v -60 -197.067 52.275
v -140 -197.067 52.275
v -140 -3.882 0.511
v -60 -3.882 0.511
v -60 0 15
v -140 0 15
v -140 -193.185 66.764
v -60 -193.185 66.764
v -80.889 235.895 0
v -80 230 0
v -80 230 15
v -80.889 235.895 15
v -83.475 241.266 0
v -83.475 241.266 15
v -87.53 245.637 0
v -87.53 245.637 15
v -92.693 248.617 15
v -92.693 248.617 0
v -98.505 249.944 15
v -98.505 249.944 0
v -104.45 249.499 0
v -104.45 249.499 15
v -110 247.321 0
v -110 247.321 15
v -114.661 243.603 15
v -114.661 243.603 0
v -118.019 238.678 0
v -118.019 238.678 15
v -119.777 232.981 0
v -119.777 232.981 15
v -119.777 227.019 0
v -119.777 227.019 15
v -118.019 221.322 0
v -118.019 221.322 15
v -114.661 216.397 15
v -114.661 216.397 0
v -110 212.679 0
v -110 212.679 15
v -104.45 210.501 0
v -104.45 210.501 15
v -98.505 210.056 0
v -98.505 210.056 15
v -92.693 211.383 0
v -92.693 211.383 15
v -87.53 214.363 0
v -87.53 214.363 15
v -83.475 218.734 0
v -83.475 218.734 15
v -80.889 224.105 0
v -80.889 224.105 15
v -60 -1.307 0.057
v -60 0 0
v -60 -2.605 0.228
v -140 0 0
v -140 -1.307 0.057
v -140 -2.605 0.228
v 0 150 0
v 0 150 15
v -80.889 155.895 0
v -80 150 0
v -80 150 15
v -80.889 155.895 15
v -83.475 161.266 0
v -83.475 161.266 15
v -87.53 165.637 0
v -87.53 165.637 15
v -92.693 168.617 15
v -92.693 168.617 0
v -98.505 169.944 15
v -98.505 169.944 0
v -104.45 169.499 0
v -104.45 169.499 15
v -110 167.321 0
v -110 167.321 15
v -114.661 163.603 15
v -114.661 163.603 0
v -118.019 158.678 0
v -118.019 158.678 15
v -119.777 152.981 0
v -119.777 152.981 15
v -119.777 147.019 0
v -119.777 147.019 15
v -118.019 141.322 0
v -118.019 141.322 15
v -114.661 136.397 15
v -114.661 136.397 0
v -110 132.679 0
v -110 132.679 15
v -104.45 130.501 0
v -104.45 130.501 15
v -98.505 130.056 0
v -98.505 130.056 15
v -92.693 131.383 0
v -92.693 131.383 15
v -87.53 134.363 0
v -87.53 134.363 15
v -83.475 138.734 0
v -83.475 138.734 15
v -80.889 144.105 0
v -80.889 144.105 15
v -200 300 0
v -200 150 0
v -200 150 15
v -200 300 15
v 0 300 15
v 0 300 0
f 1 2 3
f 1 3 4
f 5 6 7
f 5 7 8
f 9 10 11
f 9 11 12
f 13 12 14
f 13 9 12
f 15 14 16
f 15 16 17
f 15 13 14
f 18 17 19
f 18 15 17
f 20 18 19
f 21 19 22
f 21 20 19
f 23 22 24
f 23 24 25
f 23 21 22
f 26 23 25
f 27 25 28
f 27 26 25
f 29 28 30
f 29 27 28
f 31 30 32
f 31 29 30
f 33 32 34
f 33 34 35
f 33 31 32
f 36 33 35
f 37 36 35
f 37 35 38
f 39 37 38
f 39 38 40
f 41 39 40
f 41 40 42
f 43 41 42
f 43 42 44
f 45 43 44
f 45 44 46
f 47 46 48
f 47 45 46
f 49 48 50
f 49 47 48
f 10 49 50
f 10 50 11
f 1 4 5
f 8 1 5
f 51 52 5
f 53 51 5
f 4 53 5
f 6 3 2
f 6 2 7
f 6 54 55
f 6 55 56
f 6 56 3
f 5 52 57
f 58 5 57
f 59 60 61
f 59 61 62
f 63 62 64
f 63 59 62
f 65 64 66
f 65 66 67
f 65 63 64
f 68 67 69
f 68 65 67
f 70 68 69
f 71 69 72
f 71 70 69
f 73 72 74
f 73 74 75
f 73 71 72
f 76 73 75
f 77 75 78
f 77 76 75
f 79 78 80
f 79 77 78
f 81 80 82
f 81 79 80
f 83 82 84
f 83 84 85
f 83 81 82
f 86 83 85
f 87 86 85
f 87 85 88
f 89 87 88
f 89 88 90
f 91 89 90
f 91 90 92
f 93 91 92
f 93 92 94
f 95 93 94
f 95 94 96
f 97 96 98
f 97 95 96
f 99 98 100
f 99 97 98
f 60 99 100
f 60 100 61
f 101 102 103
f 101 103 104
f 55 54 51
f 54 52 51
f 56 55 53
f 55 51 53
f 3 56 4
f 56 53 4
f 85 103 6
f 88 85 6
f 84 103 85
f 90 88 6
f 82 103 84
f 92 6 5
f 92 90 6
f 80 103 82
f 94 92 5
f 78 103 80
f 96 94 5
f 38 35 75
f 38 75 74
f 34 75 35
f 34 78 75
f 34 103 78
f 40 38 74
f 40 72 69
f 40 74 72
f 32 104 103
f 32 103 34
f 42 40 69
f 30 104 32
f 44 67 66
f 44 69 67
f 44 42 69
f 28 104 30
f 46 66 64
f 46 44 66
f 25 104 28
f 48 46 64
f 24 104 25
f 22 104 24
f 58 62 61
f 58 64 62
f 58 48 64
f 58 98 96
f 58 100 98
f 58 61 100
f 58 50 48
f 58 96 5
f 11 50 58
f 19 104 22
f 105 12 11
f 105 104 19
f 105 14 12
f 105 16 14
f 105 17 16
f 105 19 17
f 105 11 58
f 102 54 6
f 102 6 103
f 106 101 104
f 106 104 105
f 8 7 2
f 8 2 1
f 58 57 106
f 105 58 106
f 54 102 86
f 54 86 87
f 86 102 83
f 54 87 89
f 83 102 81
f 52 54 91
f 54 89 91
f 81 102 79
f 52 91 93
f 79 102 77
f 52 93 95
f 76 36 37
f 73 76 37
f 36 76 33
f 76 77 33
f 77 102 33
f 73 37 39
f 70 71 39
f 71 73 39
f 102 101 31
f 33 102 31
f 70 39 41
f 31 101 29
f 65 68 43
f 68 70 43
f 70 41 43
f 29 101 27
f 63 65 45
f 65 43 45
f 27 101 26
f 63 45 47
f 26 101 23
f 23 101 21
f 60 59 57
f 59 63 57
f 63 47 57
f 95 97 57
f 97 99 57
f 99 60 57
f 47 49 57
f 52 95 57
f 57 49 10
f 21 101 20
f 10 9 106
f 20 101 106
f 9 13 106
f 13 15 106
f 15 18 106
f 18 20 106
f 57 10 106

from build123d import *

# Parameters (mm, degrees)
SKETCH1_W           = 200
SKETCH1_H           = 300
SKETCH1_R           = 20
BOSS_EXTRUDE1_DEPTH = 15
CUT_EXTRUDE1_DEPTH  = 15
SKETCH3_W           = 80
SKETCH3_H           = 15
REVOLVE1_ANGLE      = 15
SKETCH4_W           = 80
SKETCH4_H           = 15
BOSS_EXTRUDE3_DEPTH = 200


with BuildPart() as part:
    # Sketch1 → Boss-Extrude1 (new body)
    with BuildSketch(Plane.XY):
        with Locations((-100, 150)):
            Rectangle(SKETCH1_W, SKETCH1_H)
        with Locations((-100, 230)):
            Circle(SKETCH1_R, mode=Mode.SUBTRACT)
        with Locations((-100, 150)):
            Circle(SKETCH1_R, mode=Mode.SUBTRACT)
    extrude(amount=BOSS_EXTRUDE1_DEPTH)

    # Sketch2 → Cut-Extrude1 (cut)
    with BuildSketch(Plane(origin=(0, 0, 0), x_dir=(-1, 0, 0), z_dir=(0, 0, -1))):
        Polygon((0, 0), (60, 0), (0, 150), align=None)
        Polygon((200, 0), (140, 0), (200, 150), align=None)
    extrude(amount=-CUT_EXTRUDE1_DEPTH, mode=Mode.SUBTRACT)

    # Sketch3 → Revolve1 (revolve)
    with BuildSketch(Plane.XZ):
        with Locations((-100, 7.5)):
            Rectangle(SKETCH3_W, SKETCH3_H)
    revolve(axis=Axis((-60, 0, 15), (-1, 0, 0)), revolution_arc=REVOLVE1_ANGLE)

    # Sketch4 → Boss-Extrude3 (add)
    with BuildSketch(Plane(origin=(0, -3.75, 1.004809472), x_dir=(1, 0, 0), z_dir=(0, -0.9659258262890681, 0.25881904510252135))):
        with Locations((-100, 6.988887394)):
            Rectangle(SKETCH4_W, SKETCH4_H)
    extrude(amount=BOSS_EXTRUDE3_DEPTH)


solid = part.part
